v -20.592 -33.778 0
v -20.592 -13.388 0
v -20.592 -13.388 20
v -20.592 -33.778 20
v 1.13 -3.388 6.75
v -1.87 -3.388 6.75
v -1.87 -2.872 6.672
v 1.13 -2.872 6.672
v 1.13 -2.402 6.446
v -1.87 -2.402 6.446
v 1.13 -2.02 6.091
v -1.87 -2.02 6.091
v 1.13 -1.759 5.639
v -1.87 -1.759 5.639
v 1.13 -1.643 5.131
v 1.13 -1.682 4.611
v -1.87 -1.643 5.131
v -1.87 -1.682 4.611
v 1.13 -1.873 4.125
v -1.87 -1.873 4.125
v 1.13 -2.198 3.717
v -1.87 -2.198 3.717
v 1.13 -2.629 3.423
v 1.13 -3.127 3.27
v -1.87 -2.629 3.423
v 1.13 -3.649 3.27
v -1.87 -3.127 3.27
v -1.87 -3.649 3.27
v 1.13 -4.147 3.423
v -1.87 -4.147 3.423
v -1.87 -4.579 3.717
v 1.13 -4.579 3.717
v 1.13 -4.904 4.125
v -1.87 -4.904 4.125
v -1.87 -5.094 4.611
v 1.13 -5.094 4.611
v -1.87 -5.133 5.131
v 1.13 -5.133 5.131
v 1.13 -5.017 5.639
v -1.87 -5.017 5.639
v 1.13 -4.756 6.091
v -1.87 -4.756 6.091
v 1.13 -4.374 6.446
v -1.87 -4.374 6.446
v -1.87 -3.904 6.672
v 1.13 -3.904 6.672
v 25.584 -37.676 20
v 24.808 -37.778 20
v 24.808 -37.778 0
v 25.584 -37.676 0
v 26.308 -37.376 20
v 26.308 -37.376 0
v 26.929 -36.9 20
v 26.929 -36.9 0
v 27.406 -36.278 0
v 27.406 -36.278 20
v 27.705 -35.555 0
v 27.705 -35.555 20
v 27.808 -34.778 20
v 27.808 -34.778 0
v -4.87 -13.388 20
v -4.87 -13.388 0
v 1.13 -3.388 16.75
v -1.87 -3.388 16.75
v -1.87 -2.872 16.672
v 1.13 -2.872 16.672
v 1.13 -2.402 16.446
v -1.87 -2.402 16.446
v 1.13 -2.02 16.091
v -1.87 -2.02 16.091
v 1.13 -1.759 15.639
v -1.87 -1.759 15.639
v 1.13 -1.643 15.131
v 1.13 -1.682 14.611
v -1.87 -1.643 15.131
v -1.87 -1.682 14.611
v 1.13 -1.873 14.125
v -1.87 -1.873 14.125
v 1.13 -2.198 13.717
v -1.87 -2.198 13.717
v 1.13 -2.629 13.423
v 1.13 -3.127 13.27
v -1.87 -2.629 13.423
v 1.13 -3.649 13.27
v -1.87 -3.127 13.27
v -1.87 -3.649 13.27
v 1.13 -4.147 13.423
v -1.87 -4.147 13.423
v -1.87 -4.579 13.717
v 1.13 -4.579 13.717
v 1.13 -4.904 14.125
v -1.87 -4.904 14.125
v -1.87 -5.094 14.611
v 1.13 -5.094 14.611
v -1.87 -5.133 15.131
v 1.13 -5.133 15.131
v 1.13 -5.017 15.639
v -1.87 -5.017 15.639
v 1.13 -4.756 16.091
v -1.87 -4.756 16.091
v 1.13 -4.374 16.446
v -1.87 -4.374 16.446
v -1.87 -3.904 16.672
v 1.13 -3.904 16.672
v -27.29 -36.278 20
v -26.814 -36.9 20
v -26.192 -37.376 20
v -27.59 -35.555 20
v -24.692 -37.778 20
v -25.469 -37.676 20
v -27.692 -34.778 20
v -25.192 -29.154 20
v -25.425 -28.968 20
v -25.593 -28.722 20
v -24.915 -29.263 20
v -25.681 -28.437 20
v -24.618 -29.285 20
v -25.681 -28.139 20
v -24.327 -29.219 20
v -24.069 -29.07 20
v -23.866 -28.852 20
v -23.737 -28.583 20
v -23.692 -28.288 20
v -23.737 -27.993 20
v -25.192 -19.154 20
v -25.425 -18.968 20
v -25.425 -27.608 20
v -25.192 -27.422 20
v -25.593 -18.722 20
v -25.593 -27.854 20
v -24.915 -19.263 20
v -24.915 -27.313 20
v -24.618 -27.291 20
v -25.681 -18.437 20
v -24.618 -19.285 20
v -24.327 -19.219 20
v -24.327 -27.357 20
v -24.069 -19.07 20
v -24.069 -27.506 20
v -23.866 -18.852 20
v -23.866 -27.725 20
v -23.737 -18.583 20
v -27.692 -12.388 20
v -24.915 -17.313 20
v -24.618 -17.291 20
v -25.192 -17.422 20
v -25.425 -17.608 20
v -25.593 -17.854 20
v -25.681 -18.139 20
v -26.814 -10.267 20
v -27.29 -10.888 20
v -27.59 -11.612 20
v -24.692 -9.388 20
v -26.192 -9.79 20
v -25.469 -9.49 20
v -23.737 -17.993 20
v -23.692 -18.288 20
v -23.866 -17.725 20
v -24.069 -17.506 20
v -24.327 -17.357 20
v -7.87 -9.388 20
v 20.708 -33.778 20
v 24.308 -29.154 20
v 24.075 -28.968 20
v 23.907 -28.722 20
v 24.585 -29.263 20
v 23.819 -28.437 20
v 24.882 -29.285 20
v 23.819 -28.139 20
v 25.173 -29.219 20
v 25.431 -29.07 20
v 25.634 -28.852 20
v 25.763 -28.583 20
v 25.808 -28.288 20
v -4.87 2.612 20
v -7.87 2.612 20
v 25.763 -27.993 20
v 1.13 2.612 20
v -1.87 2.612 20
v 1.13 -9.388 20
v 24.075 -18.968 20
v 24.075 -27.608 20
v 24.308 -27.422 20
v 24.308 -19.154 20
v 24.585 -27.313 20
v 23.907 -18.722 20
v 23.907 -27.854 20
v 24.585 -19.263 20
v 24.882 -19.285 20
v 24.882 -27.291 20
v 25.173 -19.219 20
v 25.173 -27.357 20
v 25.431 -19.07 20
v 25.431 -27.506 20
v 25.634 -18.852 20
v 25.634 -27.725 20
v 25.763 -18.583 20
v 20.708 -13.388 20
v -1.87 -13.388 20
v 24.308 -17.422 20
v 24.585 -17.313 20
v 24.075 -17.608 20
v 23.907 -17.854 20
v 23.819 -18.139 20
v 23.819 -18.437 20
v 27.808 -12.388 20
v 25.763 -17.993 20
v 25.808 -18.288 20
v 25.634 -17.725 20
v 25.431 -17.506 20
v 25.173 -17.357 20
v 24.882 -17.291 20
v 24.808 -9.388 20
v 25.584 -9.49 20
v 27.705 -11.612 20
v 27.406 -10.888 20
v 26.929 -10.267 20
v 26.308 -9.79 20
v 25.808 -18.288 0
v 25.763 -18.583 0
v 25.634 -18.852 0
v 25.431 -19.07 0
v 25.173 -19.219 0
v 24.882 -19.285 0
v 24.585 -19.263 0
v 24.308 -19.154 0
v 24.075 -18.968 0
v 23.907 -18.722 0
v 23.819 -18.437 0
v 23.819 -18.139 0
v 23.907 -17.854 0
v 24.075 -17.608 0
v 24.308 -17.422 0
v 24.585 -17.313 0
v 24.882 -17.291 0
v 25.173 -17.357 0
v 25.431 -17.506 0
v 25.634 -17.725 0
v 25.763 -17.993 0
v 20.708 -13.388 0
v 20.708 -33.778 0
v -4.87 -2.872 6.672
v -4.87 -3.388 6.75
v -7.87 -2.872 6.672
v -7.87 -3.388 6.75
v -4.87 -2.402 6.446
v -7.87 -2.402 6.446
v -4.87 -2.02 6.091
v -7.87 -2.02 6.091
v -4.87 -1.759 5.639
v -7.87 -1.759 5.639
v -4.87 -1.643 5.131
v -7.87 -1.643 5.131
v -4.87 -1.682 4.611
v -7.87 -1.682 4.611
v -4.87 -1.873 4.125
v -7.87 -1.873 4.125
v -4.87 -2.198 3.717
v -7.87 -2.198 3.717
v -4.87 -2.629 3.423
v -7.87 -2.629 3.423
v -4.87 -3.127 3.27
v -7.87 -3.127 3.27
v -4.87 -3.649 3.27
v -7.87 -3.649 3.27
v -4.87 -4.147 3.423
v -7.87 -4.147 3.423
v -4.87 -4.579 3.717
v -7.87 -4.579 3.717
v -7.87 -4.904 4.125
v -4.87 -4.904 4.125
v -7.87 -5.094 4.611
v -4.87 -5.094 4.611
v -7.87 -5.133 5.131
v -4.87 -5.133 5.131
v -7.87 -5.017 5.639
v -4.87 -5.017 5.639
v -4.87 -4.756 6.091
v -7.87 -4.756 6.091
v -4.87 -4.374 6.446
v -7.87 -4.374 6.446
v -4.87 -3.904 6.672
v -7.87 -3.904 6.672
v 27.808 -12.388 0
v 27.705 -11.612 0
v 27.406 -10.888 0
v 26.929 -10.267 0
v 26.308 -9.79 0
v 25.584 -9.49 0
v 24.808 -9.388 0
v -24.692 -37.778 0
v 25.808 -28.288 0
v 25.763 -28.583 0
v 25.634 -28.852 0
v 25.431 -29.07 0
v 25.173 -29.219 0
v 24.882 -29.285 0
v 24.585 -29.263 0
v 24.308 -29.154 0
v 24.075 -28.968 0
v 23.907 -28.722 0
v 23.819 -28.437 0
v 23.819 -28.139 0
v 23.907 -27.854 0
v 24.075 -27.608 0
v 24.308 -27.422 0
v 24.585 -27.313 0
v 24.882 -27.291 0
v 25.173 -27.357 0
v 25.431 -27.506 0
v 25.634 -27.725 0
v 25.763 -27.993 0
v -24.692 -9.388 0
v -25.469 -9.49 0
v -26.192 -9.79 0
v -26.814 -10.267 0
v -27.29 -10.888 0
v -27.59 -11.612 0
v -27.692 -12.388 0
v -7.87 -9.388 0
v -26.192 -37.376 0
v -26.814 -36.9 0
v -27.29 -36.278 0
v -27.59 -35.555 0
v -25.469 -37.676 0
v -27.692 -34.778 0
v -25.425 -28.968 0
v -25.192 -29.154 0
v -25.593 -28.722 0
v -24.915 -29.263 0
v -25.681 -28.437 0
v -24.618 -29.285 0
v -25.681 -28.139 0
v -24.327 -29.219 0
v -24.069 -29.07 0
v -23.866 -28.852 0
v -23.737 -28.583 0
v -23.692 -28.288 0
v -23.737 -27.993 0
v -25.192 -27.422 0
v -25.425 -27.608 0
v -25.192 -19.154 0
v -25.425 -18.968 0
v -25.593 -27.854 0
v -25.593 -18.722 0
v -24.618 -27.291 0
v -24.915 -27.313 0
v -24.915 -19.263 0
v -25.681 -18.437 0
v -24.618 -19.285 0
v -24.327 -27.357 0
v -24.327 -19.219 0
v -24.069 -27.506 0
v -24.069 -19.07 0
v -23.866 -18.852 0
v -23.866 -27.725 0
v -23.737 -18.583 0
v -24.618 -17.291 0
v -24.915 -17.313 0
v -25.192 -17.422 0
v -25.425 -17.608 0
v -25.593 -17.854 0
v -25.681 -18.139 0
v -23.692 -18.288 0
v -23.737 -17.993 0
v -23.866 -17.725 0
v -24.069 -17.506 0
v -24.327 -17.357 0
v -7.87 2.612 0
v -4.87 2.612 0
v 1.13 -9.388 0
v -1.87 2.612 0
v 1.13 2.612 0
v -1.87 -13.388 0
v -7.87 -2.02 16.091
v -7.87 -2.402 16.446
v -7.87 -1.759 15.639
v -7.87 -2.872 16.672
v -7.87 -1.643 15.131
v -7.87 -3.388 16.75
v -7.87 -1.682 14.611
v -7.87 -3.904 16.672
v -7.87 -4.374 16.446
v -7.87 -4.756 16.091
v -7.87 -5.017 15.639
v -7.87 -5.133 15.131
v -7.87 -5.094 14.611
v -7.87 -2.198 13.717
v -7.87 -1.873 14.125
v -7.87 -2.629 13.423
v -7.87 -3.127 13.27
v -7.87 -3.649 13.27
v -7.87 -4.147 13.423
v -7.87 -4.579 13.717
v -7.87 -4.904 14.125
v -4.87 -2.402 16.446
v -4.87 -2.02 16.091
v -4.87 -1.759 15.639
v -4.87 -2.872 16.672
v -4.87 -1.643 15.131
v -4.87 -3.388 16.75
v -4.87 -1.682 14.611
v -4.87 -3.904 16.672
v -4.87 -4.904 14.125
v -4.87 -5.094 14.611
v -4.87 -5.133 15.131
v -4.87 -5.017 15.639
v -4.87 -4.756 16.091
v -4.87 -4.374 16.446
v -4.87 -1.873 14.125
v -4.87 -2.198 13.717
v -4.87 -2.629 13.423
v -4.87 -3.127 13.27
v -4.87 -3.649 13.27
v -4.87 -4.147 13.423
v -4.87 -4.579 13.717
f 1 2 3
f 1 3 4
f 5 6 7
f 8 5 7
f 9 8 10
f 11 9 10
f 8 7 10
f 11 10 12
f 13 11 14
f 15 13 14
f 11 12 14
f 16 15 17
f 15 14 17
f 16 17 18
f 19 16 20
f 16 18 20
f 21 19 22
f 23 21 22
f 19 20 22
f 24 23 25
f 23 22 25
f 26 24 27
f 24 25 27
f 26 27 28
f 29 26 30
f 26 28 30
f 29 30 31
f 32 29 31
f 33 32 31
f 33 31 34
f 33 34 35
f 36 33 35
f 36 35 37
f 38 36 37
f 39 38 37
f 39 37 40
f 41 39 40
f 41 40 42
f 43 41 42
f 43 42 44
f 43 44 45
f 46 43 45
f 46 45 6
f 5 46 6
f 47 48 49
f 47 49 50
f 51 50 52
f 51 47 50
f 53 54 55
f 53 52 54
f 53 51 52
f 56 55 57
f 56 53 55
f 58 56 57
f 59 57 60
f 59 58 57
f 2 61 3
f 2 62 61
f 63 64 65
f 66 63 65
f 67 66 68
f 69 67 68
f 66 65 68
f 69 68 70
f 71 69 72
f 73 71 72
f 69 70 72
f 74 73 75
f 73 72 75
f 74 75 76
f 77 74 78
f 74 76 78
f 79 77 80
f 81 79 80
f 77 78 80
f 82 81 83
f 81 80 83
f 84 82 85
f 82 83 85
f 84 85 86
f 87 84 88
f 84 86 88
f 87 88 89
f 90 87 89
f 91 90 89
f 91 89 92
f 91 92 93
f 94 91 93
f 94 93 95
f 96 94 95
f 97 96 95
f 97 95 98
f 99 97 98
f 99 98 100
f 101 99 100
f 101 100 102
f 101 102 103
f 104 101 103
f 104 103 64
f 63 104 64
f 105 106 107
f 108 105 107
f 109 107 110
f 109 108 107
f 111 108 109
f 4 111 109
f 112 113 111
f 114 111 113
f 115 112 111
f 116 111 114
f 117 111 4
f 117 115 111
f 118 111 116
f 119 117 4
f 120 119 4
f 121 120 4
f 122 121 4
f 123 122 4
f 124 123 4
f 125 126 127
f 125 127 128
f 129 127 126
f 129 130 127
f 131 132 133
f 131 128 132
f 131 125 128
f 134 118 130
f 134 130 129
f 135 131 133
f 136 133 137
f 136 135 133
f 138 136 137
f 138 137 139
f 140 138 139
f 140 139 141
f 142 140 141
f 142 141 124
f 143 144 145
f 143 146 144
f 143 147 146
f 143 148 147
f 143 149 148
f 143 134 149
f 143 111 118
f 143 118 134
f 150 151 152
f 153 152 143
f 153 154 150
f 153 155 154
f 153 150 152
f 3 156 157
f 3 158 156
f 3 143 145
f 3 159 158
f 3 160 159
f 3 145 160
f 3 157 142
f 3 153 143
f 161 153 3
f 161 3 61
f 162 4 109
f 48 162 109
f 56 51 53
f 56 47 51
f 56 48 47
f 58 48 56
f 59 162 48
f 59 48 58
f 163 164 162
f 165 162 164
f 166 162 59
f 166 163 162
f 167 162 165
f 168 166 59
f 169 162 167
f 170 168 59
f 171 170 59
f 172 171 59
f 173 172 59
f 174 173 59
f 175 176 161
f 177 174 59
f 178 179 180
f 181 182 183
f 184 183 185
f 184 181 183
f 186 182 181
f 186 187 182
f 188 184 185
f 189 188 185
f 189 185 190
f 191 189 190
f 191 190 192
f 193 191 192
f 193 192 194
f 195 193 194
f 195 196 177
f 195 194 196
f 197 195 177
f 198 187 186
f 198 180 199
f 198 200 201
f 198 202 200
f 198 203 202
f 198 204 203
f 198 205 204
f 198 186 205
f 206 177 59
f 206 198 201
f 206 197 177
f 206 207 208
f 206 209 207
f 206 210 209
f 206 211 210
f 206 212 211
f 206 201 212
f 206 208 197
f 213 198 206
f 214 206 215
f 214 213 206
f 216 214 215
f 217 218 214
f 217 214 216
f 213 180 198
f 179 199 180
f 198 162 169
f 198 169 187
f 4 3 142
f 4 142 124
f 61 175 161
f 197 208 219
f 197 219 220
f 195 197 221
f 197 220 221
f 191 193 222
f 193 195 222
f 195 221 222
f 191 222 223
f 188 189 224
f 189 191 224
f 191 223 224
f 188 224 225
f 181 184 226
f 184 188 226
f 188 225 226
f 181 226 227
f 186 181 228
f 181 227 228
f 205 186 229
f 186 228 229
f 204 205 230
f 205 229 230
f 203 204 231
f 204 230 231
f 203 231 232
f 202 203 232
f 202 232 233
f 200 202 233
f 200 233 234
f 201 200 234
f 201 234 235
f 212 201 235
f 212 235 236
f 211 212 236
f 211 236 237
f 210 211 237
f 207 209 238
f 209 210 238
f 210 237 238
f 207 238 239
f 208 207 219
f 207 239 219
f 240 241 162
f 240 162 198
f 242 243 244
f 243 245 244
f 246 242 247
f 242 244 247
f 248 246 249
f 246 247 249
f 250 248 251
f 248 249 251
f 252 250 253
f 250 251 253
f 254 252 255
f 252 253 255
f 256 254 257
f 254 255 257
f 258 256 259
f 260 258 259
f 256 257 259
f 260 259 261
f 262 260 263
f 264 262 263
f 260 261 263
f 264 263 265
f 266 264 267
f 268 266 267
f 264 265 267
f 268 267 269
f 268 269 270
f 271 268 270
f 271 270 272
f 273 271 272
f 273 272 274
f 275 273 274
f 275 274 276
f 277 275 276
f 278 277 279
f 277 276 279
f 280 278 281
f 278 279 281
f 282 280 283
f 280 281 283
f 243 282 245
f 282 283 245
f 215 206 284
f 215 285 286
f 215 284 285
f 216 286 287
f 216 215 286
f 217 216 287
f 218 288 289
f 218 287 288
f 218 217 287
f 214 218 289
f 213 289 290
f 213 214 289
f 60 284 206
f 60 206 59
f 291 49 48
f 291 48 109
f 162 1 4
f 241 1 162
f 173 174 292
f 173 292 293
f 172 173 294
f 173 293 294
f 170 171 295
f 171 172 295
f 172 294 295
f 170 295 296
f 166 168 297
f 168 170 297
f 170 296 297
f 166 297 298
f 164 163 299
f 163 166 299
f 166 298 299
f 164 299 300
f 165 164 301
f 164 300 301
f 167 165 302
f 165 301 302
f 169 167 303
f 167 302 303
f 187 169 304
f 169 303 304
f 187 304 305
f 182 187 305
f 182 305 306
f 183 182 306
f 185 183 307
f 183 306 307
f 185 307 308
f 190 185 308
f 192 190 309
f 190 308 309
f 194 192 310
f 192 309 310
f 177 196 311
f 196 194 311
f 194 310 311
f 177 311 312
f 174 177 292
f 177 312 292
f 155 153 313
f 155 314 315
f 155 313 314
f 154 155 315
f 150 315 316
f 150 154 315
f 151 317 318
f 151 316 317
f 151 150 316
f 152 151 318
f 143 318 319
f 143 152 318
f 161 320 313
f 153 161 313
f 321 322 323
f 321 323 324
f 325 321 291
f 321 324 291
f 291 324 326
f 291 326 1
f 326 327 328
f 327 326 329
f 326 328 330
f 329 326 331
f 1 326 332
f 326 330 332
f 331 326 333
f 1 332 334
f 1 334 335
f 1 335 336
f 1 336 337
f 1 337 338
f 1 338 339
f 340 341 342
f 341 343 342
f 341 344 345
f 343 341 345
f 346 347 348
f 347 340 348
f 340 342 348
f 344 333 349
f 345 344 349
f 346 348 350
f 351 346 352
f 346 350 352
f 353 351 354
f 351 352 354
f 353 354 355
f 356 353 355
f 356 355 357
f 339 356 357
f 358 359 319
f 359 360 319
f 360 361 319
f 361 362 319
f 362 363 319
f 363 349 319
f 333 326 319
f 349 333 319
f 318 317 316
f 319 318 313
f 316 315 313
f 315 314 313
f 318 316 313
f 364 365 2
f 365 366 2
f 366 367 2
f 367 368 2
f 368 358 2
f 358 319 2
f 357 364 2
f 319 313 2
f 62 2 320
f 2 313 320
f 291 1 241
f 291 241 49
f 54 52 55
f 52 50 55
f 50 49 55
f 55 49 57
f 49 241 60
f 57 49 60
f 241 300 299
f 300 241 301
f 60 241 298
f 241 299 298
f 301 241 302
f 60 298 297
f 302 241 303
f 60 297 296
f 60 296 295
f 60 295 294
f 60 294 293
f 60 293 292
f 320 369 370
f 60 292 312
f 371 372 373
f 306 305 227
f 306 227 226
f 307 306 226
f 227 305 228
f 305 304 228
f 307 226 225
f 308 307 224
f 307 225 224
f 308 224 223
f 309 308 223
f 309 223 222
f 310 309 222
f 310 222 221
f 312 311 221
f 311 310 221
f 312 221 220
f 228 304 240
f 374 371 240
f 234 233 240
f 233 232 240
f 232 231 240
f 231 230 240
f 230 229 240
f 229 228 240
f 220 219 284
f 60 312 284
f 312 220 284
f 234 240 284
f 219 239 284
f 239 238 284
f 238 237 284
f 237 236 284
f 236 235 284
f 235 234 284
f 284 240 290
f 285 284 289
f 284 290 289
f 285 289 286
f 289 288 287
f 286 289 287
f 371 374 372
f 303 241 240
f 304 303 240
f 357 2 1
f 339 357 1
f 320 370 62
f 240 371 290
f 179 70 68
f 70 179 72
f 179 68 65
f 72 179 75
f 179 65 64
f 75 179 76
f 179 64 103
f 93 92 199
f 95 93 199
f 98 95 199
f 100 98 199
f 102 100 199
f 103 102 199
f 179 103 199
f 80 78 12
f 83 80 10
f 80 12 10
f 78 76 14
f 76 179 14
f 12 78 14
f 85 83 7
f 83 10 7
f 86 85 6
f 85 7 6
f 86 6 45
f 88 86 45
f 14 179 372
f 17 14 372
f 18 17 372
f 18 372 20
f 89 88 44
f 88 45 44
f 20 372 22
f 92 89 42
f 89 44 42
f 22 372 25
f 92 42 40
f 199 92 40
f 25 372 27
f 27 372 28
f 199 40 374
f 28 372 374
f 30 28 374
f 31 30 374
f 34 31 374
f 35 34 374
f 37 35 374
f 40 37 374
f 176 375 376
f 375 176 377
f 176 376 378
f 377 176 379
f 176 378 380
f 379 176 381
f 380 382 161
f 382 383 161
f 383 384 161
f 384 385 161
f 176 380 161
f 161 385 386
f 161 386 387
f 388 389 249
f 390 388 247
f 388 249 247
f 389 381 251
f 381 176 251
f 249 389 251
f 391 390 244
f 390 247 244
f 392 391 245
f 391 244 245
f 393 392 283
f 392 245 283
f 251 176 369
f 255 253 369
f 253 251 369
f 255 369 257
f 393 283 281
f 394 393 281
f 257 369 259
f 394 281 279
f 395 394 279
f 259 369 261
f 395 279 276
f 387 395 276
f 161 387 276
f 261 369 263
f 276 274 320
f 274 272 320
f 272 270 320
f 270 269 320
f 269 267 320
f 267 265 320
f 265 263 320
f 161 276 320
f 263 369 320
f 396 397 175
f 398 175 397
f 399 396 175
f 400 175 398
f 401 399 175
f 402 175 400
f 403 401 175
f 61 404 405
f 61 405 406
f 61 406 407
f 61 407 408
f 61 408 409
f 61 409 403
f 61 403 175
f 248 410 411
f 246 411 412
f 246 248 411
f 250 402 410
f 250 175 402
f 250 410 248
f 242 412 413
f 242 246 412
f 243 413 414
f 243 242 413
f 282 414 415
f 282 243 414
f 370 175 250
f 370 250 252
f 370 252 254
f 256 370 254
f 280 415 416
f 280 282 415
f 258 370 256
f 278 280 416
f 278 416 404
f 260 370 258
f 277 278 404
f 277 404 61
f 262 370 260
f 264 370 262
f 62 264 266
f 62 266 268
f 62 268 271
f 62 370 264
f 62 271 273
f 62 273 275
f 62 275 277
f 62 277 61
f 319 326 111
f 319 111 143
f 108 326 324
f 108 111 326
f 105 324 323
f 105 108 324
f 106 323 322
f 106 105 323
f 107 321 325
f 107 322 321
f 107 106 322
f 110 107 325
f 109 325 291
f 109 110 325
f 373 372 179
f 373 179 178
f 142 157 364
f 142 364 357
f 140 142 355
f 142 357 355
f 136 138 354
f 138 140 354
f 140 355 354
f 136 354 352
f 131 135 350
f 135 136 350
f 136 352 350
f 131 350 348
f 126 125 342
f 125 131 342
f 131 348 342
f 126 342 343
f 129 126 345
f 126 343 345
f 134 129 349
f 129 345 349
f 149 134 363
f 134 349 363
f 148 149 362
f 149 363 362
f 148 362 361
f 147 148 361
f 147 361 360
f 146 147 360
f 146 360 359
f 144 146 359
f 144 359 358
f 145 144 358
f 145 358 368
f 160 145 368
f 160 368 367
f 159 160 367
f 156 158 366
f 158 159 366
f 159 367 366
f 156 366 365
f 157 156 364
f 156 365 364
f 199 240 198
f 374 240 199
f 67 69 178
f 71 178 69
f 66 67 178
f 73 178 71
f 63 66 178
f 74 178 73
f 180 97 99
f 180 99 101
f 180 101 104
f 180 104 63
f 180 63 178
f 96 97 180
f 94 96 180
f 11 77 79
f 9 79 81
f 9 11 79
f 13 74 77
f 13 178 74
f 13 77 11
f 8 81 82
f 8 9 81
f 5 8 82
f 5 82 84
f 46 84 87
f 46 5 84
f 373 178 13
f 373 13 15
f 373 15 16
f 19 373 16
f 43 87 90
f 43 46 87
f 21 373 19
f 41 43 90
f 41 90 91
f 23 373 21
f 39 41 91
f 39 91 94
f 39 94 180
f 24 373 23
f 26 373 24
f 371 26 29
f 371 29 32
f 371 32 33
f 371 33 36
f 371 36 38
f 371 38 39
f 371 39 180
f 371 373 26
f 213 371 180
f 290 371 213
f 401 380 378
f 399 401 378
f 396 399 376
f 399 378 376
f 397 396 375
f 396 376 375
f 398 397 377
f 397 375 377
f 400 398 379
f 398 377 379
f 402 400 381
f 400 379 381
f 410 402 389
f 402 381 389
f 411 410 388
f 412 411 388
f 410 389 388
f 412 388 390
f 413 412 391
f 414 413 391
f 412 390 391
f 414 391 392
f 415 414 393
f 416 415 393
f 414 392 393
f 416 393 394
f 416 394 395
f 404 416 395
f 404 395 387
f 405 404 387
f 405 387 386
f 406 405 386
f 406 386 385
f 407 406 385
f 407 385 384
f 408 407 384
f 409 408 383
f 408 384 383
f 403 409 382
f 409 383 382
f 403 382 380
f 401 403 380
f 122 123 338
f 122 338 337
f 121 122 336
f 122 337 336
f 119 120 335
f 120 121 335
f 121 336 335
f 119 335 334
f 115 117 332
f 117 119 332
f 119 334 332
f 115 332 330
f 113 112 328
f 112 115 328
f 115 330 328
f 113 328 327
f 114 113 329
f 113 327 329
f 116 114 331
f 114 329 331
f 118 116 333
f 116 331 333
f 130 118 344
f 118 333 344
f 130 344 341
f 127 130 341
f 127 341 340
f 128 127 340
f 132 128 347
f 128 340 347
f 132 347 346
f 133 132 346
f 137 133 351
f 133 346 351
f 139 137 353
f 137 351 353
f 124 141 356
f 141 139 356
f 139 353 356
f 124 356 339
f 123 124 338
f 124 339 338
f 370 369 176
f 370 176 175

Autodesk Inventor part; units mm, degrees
ref_plane "YZ Plane" through (0, 0, 0) normal (1, 0, 0) x (0, 1, 0)
ref_plane "XZ Plane" through (0, 0, 0) normal (0, 1, 0) x (-1, 0, 0)
ref_plane "XY Plane" through (0, 0, 0) normal (0, 0, 1) x (1, 0, 0)
sketch "Block1" plane through (0, 0, 0) normal (0, 0, 1) x (1, 0, 0)
  line L0 (-1.8704, 39.5395) -> (-1.8704, -10.4605)
  line L1 (-4.8704, 39.5395) -> (-4.8704, -10.4605)
  arc A0 (25.8721, -18.7556) -> (25.8721, -22.1655) centre (24.8076, -20.4605) ccw
  arc A1 (25.8721, -28.7556) -> (25.8721, -32.1655) centre (24.8076, -30.4605) ccw
  arc A2 (-25.7569, -32.1655) -> (-25.7569, -28.7556) centre (-24.6924, -30.4605) ccw
  arc A3 (-25.7569, -22.1655) -> (-25.7569, -18.7556) centre (-24.6924, -20.4605) ccw
  line L2 (10.765, -35.4505) -> (20.1076, -35.4505)
  line L3 (20.2076, -15.5605) -> (20.2076, -35.3605)
  line L4 (-20.0924, -15.5605) -> (-20.0924, -35.3605)
  point P0 (0.9099, -18.4595)
sketch "Sketch1" plane through (0, 0, 0) normal (0, 0, 1) x (1, 0, 0)
  circle A0 centre (24.8076, -18.2882) radius 1
  circle A1 centre (24.8076, -28.2882) radius 1
  circle A2 centre (-24.6924, -28.2882) radius 1
  circle A3 centre (-24.6924, -18.2882) radius 1
  line L0 (20.7076, -13.3882) -> (-20.5924, -13.3882)
  line L1 (-20.5924, -13.3882) -> (-20.5924, -33.7782)
  line L2 (-20.5924, -33.7782) -> (20.7076, -33.7782)
  line L3 (20.7076, -33.7782) -> (20.7076, -13.3882)
  line L4 (27.8076, -37.7782) -> (-27.6924, -37.7782)
  line L5 (-27.6924, -37.7782) -> (-27.6924, 2.6118)
  line L6 (-27.6924, 2.6118) -> (27.8076, 2.6118)
  line L7 (27.8076, 2.6118) -> (27.8076, -37.7782)
  line L8 (-1.8704, -8.2882) -> (-1.8704, -13.3882)
  line L9 (-4.8704, -8.2882) -> (-4.8704, -13.3882)
  line L10 (-27.6924, 2.6118) -> (-7.8704, 2.6118)
  line L11 (-7.8704, 2.6118) -> (-7.8704, -9.3882)
  line L12 (-7.8704, -9.3882) -> (-27.6924, -9.3882)
  line L13 (-27.6924, -9.3882) -> (-27.6924, 2.6118)
  line L14 (27.8076, 2.6118) -> (1.1296, 2.6118)
  line L15 (1.1296, 2.6118) -> (1.1296, -9.3882)
  line L16 (1.1296, -9.3882) -> (27.8076, -9.3882)
  line L17 (27.8076, -9.3882) -> (27.8076, 2.6118)
  line L18 (-1.8704, 41.7118) -> (-1.8704, -8.2882)
  line L19 (-4.8704, 41.7118) -> (-4.8704, -8.2882)
  arc A4 (25.8721, -16.5832) -> (25.8721, -19.9932) centre (24.8076, -18.2882) ccw
  arc A5 (25.8721, -26.5832) -> (25.8721, -29.9932) centre (24.8076, -28.2882) ccw
  arc A6 (-25.7569, -29.9932) -> (-25.7569, -26.5832) centre (-24.6924, -28.2882) ccw
  arc A7 (-25.7569, -19.9932) -> (-25.7569, -16.5832) centre (-24.6924, -18.2882) ccw
  line L20 (10.765, -33.2782) -> (20.1076, -33.2782)
  line L21 (20.2076, -13.3882) -> (20.2076, -33.1882)
  line L22 (-20.0924, -13.3882) -> (-20.0924, -33.1882)
  point P0 (0, 0)
  point P1 (15.4363, -33.2782)
  point P2 (-4.8704, -8.2882)
  point P3 (-4.8704, 2.6118)
  point P4 (-1.8704, 2.6118)
  point P5 (-1.8704, -8.2882)
  dimension "d0" = 2
  dimension "d1" = 2
  dimension "d2" = 2
  dimension "d3" = 2
  dimension "d4" = 0.5
  dimension "d5" = 0.5
  dimension "d6" = 0.5
  dimension "d7" = 3
  dimension "d8" = 3
  dimension "d9" = 3
  dimension "d10" = 3
  dimension "d11" = 12
  dimension "d12" = 12
  dimension "d13" = 4
  dimension "d14" = 4
extrude "Extrusion1" add sketch "Sketch1" along normal blind 20 contours L0 L8 L18 L6 L15 L16 L7 L4 L5 L12 L11 L19 L9 L1 L2 L3
sketch "Sketch2" plane through (-7.8704, -9.3882, 0) normal (-1, 0, 0) x (0, 0, 1)
  line L0 (0, 12) -> (0, 0) projected
  line L1 (0, 0) -> (20, 0) projected
  line L2 (20, 12) -> (20, 0) projected
  line L3 (0, 12) -> (20, 12) projected
  line L4 (20, 6) -> (0, 6)
  line L5 (0, -4) -> (0, 12) projected
  circle A0 centre (15, 6) radius 1.75
  circle A1 centre (5, 6) radius 1.75
  point P0 (0, 9.3882)
  dimension "d17" = 3.5
  dimension "d18" = 3.5
  dimension "d19" = 10
  dimension "d20" = 20
  dimension "d21" = 5
extrude "Extrusion2" cut sketch "Sketch2" against normal blind 20 contours A1 L4 | L4 A1 | A0 L4 | L4 A0
fillet "Fillet1" radius 3 4 edges at (27.8076, -9.3882, 10) (27.8076, -37.7782, 10) (-27.6924, -37.7782, 10) (-27.6924, -9.3882, 10)
equation "\"d6\" = d4"
equation "\"d12\" = d11"
properties part number "Servo mount_3DPrint"
